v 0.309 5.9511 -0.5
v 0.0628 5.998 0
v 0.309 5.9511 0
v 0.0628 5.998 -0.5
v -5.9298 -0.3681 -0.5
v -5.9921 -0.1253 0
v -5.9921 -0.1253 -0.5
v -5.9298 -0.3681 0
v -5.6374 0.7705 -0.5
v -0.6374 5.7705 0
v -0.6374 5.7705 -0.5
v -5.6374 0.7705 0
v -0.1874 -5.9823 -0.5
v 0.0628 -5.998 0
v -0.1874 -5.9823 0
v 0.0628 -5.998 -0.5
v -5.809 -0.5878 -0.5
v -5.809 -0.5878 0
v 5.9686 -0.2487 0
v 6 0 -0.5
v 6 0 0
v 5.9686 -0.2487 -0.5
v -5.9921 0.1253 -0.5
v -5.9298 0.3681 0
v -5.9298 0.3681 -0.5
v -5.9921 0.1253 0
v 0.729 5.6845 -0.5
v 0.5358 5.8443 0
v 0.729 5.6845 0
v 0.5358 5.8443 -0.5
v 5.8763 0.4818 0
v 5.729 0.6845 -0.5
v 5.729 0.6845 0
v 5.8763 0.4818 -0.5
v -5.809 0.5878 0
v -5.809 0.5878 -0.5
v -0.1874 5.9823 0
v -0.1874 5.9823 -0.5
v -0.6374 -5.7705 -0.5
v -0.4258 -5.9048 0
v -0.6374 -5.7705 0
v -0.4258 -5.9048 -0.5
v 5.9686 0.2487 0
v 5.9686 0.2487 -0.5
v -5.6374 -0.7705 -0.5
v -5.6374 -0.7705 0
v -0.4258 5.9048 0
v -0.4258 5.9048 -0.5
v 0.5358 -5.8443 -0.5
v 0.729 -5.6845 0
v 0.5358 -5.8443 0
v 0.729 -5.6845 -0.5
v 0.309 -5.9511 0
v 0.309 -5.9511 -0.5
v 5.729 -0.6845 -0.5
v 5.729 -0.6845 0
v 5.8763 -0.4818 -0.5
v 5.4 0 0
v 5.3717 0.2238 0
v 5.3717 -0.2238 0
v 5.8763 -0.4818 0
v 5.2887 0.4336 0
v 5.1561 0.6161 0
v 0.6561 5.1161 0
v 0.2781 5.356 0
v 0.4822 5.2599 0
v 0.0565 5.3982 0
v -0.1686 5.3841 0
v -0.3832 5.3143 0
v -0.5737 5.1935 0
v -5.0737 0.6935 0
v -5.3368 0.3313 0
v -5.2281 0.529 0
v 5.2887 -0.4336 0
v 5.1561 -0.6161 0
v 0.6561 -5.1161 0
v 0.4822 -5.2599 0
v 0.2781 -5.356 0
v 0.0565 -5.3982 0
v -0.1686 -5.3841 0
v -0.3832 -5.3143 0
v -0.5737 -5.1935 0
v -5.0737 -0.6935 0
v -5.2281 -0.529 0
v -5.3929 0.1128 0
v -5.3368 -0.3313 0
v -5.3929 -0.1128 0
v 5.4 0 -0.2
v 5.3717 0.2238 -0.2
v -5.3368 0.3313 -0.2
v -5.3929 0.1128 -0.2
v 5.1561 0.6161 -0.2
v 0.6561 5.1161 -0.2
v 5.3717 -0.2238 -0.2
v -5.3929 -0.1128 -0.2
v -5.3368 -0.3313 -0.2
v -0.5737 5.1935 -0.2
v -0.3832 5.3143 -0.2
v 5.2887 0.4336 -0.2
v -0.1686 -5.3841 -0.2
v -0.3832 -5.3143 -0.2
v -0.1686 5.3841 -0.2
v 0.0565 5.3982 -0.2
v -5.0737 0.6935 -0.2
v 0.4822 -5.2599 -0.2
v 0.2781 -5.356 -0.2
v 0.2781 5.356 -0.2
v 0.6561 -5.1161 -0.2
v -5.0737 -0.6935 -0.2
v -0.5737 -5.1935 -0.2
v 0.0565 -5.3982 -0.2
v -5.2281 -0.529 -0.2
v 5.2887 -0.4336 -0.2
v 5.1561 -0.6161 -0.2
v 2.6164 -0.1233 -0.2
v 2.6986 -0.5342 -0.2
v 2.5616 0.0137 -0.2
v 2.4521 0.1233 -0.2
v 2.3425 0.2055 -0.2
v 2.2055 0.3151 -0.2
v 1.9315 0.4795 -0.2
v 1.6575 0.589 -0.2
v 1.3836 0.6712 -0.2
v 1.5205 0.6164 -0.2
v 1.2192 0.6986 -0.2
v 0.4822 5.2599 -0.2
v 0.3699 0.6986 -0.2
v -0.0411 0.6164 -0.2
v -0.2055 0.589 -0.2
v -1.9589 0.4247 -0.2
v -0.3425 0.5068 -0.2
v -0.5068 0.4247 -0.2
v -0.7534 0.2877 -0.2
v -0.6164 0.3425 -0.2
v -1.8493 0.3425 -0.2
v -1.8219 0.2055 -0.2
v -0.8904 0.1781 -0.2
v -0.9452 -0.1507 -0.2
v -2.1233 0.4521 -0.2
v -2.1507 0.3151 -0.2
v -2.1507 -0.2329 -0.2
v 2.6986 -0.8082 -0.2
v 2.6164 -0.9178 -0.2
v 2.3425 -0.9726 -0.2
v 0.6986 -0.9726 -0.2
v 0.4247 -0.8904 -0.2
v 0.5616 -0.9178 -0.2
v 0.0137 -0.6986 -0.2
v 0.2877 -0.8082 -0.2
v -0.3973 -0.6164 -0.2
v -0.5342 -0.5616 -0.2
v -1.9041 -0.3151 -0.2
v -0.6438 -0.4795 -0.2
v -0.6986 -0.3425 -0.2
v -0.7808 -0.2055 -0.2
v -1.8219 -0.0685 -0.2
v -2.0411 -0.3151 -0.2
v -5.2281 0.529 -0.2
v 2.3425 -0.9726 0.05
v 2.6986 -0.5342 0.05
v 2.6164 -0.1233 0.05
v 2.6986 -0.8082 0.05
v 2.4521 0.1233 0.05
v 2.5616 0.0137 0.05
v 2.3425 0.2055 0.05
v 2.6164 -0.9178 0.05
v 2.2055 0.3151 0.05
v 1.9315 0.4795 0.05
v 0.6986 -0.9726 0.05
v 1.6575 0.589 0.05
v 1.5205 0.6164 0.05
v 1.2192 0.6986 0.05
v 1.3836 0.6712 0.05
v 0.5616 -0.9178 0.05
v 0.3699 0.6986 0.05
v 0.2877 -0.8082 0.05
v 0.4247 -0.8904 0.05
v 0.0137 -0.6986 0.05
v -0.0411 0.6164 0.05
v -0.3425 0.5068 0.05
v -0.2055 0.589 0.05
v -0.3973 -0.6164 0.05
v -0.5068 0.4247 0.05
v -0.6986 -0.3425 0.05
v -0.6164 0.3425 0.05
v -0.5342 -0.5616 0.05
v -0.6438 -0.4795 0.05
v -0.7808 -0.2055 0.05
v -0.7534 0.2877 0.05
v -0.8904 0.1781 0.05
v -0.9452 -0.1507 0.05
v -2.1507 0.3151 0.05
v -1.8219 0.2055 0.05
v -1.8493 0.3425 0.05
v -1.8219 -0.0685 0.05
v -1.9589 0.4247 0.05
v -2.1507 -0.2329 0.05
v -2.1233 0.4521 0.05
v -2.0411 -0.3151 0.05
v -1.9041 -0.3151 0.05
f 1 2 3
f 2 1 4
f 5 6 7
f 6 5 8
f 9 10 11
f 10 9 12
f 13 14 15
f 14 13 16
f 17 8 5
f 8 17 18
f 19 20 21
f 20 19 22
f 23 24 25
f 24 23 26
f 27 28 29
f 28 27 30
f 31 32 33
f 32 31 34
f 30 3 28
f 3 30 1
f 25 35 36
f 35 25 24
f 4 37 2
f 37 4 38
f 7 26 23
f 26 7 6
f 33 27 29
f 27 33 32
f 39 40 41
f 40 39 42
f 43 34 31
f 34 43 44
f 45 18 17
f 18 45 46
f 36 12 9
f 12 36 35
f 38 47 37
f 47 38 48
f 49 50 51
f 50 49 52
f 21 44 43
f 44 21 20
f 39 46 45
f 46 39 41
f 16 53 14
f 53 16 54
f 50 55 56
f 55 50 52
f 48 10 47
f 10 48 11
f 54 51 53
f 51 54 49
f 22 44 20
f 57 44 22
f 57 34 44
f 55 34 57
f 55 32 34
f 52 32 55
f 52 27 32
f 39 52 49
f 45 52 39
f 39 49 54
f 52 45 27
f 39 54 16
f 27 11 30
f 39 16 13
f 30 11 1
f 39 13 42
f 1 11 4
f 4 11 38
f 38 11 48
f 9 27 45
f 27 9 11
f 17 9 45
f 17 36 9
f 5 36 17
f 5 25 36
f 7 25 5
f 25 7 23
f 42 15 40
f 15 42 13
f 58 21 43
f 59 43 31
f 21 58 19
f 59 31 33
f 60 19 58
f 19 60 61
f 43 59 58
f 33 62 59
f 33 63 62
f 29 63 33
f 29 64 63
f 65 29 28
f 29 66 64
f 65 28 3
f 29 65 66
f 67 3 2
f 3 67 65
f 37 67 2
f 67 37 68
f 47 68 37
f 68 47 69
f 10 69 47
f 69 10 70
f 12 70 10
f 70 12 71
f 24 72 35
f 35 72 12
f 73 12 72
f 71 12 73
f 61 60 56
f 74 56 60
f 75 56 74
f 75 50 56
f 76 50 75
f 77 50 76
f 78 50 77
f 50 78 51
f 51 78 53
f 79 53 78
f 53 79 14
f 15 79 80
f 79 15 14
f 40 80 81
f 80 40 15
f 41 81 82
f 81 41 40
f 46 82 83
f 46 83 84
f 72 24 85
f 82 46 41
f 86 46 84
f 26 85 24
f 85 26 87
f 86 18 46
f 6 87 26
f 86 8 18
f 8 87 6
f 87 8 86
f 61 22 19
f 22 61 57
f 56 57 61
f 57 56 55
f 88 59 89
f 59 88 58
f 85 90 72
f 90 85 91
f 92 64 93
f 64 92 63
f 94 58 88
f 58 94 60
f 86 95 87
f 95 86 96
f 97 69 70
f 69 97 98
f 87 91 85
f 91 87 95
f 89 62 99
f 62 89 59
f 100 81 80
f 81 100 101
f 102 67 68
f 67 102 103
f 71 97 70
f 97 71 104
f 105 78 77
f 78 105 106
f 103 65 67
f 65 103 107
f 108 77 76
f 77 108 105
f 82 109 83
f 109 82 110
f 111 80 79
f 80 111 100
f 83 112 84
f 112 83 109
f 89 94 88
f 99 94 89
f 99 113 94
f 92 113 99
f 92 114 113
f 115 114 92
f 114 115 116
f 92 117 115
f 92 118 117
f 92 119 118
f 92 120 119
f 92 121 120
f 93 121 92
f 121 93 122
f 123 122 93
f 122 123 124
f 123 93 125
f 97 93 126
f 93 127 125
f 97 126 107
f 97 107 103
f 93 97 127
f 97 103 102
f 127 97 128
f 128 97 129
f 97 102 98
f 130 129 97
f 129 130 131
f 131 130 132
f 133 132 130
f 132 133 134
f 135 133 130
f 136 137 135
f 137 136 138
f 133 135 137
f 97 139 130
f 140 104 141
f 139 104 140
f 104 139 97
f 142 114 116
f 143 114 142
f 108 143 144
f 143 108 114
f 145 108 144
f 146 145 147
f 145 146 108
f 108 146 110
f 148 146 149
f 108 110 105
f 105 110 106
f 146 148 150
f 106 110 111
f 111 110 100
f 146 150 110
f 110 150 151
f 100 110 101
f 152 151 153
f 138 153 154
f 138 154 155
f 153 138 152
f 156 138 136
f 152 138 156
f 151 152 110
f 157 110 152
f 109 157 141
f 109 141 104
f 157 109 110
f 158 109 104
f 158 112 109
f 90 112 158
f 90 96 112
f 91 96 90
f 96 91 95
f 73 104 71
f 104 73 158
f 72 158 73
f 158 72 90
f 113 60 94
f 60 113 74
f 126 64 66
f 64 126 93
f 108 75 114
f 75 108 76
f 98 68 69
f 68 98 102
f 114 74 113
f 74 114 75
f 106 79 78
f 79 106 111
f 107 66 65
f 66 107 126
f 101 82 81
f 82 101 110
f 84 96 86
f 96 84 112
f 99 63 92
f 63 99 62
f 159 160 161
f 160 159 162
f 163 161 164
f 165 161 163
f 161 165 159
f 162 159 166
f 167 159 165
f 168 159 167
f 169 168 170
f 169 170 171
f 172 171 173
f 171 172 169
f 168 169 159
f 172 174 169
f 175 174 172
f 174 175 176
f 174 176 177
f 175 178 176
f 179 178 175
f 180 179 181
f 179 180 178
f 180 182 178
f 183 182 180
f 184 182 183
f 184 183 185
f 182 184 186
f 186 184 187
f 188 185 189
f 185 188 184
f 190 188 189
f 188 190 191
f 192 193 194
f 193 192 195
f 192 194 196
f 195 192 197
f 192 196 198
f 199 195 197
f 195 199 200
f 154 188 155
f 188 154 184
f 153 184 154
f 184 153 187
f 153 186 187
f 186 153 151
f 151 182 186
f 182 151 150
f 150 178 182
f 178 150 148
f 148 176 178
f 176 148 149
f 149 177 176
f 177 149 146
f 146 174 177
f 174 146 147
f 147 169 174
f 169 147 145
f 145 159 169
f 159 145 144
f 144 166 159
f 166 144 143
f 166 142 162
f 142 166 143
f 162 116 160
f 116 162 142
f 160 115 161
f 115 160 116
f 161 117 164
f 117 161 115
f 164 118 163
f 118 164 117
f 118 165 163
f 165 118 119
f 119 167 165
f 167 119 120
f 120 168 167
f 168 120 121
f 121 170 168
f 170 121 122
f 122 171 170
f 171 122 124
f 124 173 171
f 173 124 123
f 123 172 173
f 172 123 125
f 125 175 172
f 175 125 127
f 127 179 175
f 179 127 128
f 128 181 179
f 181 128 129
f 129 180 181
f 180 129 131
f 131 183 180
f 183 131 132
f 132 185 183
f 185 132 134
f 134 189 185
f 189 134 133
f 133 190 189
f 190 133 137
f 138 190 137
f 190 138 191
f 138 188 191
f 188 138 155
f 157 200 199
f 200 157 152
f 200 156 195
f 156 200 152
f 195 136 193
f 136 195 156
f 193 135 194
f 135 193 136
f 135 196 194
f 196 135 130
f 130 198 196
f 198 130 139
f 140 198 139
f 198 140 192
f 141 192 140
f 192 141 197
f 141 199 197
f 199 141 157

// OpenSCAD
// Arbitrary signage
//
// by seedwire
// 11/15/2013
//

// preview[view:west, tilt:top]

// Pick the sign outline here!
outline = "diamond"; //[triangle,circle,no-circle,diamond]

// Draw or choose an image on one (or both) of the tabs!

/*[Drawing]*/
// Use the drawing?
use_drawing = "yes";//[yes,no]

// Use to scale the sign within outline
my_scale = 100.0; //[1:200]

// Use to position within outline (X)
my_x = 0.0; //[-50:50]

// Use to position within outline (Y)
my_y = 0.0; //[-50:50]

// Draw your sign here!
my_sign = [[[-1.0000000000000016,1.0000000000000016],[1.0000000000000016,1.0000000000000016],[1.0000000000000016,-1.0000000000000016],[-1.0000000000000016,-1.0000000000000016],[-1.7808219178082192,-8.904109589041095],[1.5068493150684932,-9.452054794520548],[2.054794520547945,-7.808219178082192],[2.054794520547945,-7.808219178082192],[3.4246575342465753,-6.986301369863014],[3.4246575342465753,-6.986301369863014],[4.794520547945205,-6.438356164383562],[5.616438356164384,-5.342465753424658],[5.616438356164384,-5.342465753424658],[6.164383561643835,-3.9726027397260277],[6.164383561643835,-3.9726027397260277],[6.438356164383562,-2.6027397260273974],[6.438356164383562,-2.6027397260273974],[6.712328767123288,-1.2328767123287672],[6.712328767123288,-1.2328767123287672],[6.986301369863014,0.136986301369863],[6.986301369863014,0.136986301369863],[7.534246575342466,1.5068493150684932],[7.534246575342466,1.5068493150684932],[8.082191780821917,2.8767123287671232],[8.904109589041095,4.2465753424657535],[9.178082191780822,5.616438356164384],[9.726027397260275,6.986301369863014],[9.726027397260275,8.356164383561644],[9.726027397260275,9.726027397260275],[9.726027397260275,11.095890410958905],[9.726027397260275,12.465753424657535],[9.726027397260275,13.835616438356164],[9.726027397260275,15.205479452054796],[9.726027397260275,16.575342465753426],[9.726027397260275,17.945205479452056],[9.726027397260275,19.315068493150687],[9.726027397260275,20.684931506849317],[9.726027397260275,22.054794520547947],[9.726027397260275,23.424657534246577],[9.452054794520548,24.794520547945208],[9.178082191780822,26.164383561643834],[8.082191780821917,26.986301369863014],[6.712328767123288,26.986301369863014],[5.342465753424658,26.986301369863014],[3.9726027397260277,26.71232876712329],[2.6027397260273974,26.438356164383563],[1.2328767123287672,26.164383561643834],[-0.136986301369863,25.616438356164384],[-1.2328767123287672,24.52054794520548],[-2.054794520547945,23.424657534246577],[-3.1506849315068495,22.054794520547947],[-3.9726027397260277,20.684931506849317],[-4.794520547945205,19.315068493150687],[-5.342465753424658,17.945205479452056],[-5.89041095890411,16.575342465753426],[-6.164383561643835,15.205479452054796],[-6.712328767123288,13.835616438356164],[-6.986301369863014,12.191780821917808],[-6.986301369863014,10.821917808219178],[-6.986301369863014,9.452054794520548],[-6.986301369863014,8.082191780821917],[-6.986301369863014,6.712328767123288],[-6.986301369863014,5.342465753424658],[-6.986301369863014,3.6986301369863015],[-6.712328767123288,2.328767123287671],[-6.438356164383562,0.9589041095890412],[-6.164383561643835,-0.410958904109589],[-5.89041095890411,-2.054794520547945],[-5.068493150684931,-3.4246575342465753],[-4.2465753424657535,-5.068493150684931],[-3.4246575342465753,-6.164383561643835],[-2.8767123287671232,-7.534246575342466],[-0.684931506849315,-18.21917808219178],[-2.054794520547945,-18.21917808219178],[-3.4246575342465753,-18.493150684931507],[-4.2465753424657535,-19.589041095890412],[-4.52054794520548,-21.232876712328768],[-3.1506849315068495,-21.506849315068493],[-1.7808219178082192,-21.506849315068493],[-0.410958904109589,-21.506849315068493],[0.9589041095890412,-21.506849315068493],[2.328767123287671,-21.506849315068493],[3.1506849315068495,-20.410958904109588],[3.1506849315068495,-19.041095890410958],[0.684931506849315,-18.21917808219178]],[[4,5,6,7,8,9,10,11,12,13,14,15,16,17,18,19,20,21,22,23,24,25,26,27,28,29,30,31,32,33,34,35,36,37,38,39,40,41,42,43,44,45,46,47,48,49,50,51,52,53,54,55,56,57,58,59,60,61,62,63,64,65,66,67,68,69,70,71],[72,73,74,75,76,77,78,79,80,81,82,83,84]]]; //[draw_polygon:100x100]

/*[Image]*/

// Use the image file?
use_image = "no"; //[yes,no]

// Load a 100x100 pixel image
image_file = "image-surface.dat"; // [image_surface:100x100]

// Use to scale the image within outline
my_image_scale = 100.0; //[1:200]

// Use to scale the image height within outline
my_image_height = 100.0; //[1:200]

// Use to position image within outline (X)
my_image_x = 0.0; //[-50:50]

// Use to position image within outline (Y)
my_image_y = 0.0; //[-50:50]


/*[Hidden]*/
$fn=25;

if(use_drawing=="yes"){ intersection() {
	translate([0,0,5/4]) scale([0.9,0.9,5]) outline();
	union() {
		color([1,0,0]) scale([my_scale/100.0, my_scale/100.0, 1.0]) scale([0.1,0.1,1]) translate([my_y,my_x,-0.2]) rotate(-90,[0,0,1]) linear_extrude(height=0.25) polygon(points = my_sign[0], paths = my_sign[1]);
	}
}}

if(use_image=="yes") {
	intersection() {
	translate([0,0,5/4]) scale([0.9,0.9,5]) outline();
	union() {
	
	color([1,0,0]) scale([my_image_scale/200,my_image_scale/200,my_image_height/200.0]) translate([my_image_y,my_image_x,-0.2]) rotate(-90,[0,0,1]) surface(file=image_file, center=true, convexity=5);  	
	}
}}

outline();


module outline() 
{
if(outline == "triangle") {
	difference() { 
		translate([0,0,-0.5]) hull() {
		translate([-3,-5,0]) cylinder(r=1,h=0.5);
		translate([-3,5,0]) cylinder(r=1,h=0.5);
		translate([5,0,0]) cylinder(r=1,h=0.5);
		}		
		translate([0,0,-0.2]) scale([0.9,0.9,1]) hull() {
		translate([-3,-5,0]) cylinder(r=1,h=0.25);
		translate([-3,5,0]) cylinder(r=1,h=0.25);
		translate([5,0,0]) cylinder(r=1,h=0.25);
		}		

	}
	
} else if(outline == "circle") {
	difference() { 
		translate([0,0,-0.5]) cylinder(r=5,h=0.5);
		translate([0,0,-0.2]) scale([0.9,0.9,1]) cylinder(r=5,h=0.5);		
	}
} else if(outline == "no-circle") {
	difference() { 
		translate([0,0,-0.5]) cylinder(r=5,h=0.5);
		translate([0,0,-0.2]) scale([0.9,0.9,1]) cylinder(r=5,h=0.5);
	}
	translate([0,0,-0.15]) rotate(45,[0,0,1]) cube([1,9.5,0.25], center=true);
} else {
	difference() { 
		translate([0,0,-0.5]) hull() {
		translate([-0,-5,0]) cylinder(r=1,h=0.5);
		translate([-0,5,0]) cylinder(r=1,h=0.5);
		translate([5,0,0]) cylinder(r=1,h=0.5);
		translate([-5,0,0]) cylinder(r=1,h=0.5);

		}		
		translate([0,0,-0.2]) scale([0.9,0.9,1]) hull() {
		translate([-0,-5,0]) cylinder(r=1,h=0.5);
		translate([-0,5,0]) cylinder(r=1,h=0.5);
		translate([5,0,0]) cylinder(r=1,h=0.5);
		translate([-5,0,0]) cylinder(r=1,h=0.5);
		}		
	}
}
}



